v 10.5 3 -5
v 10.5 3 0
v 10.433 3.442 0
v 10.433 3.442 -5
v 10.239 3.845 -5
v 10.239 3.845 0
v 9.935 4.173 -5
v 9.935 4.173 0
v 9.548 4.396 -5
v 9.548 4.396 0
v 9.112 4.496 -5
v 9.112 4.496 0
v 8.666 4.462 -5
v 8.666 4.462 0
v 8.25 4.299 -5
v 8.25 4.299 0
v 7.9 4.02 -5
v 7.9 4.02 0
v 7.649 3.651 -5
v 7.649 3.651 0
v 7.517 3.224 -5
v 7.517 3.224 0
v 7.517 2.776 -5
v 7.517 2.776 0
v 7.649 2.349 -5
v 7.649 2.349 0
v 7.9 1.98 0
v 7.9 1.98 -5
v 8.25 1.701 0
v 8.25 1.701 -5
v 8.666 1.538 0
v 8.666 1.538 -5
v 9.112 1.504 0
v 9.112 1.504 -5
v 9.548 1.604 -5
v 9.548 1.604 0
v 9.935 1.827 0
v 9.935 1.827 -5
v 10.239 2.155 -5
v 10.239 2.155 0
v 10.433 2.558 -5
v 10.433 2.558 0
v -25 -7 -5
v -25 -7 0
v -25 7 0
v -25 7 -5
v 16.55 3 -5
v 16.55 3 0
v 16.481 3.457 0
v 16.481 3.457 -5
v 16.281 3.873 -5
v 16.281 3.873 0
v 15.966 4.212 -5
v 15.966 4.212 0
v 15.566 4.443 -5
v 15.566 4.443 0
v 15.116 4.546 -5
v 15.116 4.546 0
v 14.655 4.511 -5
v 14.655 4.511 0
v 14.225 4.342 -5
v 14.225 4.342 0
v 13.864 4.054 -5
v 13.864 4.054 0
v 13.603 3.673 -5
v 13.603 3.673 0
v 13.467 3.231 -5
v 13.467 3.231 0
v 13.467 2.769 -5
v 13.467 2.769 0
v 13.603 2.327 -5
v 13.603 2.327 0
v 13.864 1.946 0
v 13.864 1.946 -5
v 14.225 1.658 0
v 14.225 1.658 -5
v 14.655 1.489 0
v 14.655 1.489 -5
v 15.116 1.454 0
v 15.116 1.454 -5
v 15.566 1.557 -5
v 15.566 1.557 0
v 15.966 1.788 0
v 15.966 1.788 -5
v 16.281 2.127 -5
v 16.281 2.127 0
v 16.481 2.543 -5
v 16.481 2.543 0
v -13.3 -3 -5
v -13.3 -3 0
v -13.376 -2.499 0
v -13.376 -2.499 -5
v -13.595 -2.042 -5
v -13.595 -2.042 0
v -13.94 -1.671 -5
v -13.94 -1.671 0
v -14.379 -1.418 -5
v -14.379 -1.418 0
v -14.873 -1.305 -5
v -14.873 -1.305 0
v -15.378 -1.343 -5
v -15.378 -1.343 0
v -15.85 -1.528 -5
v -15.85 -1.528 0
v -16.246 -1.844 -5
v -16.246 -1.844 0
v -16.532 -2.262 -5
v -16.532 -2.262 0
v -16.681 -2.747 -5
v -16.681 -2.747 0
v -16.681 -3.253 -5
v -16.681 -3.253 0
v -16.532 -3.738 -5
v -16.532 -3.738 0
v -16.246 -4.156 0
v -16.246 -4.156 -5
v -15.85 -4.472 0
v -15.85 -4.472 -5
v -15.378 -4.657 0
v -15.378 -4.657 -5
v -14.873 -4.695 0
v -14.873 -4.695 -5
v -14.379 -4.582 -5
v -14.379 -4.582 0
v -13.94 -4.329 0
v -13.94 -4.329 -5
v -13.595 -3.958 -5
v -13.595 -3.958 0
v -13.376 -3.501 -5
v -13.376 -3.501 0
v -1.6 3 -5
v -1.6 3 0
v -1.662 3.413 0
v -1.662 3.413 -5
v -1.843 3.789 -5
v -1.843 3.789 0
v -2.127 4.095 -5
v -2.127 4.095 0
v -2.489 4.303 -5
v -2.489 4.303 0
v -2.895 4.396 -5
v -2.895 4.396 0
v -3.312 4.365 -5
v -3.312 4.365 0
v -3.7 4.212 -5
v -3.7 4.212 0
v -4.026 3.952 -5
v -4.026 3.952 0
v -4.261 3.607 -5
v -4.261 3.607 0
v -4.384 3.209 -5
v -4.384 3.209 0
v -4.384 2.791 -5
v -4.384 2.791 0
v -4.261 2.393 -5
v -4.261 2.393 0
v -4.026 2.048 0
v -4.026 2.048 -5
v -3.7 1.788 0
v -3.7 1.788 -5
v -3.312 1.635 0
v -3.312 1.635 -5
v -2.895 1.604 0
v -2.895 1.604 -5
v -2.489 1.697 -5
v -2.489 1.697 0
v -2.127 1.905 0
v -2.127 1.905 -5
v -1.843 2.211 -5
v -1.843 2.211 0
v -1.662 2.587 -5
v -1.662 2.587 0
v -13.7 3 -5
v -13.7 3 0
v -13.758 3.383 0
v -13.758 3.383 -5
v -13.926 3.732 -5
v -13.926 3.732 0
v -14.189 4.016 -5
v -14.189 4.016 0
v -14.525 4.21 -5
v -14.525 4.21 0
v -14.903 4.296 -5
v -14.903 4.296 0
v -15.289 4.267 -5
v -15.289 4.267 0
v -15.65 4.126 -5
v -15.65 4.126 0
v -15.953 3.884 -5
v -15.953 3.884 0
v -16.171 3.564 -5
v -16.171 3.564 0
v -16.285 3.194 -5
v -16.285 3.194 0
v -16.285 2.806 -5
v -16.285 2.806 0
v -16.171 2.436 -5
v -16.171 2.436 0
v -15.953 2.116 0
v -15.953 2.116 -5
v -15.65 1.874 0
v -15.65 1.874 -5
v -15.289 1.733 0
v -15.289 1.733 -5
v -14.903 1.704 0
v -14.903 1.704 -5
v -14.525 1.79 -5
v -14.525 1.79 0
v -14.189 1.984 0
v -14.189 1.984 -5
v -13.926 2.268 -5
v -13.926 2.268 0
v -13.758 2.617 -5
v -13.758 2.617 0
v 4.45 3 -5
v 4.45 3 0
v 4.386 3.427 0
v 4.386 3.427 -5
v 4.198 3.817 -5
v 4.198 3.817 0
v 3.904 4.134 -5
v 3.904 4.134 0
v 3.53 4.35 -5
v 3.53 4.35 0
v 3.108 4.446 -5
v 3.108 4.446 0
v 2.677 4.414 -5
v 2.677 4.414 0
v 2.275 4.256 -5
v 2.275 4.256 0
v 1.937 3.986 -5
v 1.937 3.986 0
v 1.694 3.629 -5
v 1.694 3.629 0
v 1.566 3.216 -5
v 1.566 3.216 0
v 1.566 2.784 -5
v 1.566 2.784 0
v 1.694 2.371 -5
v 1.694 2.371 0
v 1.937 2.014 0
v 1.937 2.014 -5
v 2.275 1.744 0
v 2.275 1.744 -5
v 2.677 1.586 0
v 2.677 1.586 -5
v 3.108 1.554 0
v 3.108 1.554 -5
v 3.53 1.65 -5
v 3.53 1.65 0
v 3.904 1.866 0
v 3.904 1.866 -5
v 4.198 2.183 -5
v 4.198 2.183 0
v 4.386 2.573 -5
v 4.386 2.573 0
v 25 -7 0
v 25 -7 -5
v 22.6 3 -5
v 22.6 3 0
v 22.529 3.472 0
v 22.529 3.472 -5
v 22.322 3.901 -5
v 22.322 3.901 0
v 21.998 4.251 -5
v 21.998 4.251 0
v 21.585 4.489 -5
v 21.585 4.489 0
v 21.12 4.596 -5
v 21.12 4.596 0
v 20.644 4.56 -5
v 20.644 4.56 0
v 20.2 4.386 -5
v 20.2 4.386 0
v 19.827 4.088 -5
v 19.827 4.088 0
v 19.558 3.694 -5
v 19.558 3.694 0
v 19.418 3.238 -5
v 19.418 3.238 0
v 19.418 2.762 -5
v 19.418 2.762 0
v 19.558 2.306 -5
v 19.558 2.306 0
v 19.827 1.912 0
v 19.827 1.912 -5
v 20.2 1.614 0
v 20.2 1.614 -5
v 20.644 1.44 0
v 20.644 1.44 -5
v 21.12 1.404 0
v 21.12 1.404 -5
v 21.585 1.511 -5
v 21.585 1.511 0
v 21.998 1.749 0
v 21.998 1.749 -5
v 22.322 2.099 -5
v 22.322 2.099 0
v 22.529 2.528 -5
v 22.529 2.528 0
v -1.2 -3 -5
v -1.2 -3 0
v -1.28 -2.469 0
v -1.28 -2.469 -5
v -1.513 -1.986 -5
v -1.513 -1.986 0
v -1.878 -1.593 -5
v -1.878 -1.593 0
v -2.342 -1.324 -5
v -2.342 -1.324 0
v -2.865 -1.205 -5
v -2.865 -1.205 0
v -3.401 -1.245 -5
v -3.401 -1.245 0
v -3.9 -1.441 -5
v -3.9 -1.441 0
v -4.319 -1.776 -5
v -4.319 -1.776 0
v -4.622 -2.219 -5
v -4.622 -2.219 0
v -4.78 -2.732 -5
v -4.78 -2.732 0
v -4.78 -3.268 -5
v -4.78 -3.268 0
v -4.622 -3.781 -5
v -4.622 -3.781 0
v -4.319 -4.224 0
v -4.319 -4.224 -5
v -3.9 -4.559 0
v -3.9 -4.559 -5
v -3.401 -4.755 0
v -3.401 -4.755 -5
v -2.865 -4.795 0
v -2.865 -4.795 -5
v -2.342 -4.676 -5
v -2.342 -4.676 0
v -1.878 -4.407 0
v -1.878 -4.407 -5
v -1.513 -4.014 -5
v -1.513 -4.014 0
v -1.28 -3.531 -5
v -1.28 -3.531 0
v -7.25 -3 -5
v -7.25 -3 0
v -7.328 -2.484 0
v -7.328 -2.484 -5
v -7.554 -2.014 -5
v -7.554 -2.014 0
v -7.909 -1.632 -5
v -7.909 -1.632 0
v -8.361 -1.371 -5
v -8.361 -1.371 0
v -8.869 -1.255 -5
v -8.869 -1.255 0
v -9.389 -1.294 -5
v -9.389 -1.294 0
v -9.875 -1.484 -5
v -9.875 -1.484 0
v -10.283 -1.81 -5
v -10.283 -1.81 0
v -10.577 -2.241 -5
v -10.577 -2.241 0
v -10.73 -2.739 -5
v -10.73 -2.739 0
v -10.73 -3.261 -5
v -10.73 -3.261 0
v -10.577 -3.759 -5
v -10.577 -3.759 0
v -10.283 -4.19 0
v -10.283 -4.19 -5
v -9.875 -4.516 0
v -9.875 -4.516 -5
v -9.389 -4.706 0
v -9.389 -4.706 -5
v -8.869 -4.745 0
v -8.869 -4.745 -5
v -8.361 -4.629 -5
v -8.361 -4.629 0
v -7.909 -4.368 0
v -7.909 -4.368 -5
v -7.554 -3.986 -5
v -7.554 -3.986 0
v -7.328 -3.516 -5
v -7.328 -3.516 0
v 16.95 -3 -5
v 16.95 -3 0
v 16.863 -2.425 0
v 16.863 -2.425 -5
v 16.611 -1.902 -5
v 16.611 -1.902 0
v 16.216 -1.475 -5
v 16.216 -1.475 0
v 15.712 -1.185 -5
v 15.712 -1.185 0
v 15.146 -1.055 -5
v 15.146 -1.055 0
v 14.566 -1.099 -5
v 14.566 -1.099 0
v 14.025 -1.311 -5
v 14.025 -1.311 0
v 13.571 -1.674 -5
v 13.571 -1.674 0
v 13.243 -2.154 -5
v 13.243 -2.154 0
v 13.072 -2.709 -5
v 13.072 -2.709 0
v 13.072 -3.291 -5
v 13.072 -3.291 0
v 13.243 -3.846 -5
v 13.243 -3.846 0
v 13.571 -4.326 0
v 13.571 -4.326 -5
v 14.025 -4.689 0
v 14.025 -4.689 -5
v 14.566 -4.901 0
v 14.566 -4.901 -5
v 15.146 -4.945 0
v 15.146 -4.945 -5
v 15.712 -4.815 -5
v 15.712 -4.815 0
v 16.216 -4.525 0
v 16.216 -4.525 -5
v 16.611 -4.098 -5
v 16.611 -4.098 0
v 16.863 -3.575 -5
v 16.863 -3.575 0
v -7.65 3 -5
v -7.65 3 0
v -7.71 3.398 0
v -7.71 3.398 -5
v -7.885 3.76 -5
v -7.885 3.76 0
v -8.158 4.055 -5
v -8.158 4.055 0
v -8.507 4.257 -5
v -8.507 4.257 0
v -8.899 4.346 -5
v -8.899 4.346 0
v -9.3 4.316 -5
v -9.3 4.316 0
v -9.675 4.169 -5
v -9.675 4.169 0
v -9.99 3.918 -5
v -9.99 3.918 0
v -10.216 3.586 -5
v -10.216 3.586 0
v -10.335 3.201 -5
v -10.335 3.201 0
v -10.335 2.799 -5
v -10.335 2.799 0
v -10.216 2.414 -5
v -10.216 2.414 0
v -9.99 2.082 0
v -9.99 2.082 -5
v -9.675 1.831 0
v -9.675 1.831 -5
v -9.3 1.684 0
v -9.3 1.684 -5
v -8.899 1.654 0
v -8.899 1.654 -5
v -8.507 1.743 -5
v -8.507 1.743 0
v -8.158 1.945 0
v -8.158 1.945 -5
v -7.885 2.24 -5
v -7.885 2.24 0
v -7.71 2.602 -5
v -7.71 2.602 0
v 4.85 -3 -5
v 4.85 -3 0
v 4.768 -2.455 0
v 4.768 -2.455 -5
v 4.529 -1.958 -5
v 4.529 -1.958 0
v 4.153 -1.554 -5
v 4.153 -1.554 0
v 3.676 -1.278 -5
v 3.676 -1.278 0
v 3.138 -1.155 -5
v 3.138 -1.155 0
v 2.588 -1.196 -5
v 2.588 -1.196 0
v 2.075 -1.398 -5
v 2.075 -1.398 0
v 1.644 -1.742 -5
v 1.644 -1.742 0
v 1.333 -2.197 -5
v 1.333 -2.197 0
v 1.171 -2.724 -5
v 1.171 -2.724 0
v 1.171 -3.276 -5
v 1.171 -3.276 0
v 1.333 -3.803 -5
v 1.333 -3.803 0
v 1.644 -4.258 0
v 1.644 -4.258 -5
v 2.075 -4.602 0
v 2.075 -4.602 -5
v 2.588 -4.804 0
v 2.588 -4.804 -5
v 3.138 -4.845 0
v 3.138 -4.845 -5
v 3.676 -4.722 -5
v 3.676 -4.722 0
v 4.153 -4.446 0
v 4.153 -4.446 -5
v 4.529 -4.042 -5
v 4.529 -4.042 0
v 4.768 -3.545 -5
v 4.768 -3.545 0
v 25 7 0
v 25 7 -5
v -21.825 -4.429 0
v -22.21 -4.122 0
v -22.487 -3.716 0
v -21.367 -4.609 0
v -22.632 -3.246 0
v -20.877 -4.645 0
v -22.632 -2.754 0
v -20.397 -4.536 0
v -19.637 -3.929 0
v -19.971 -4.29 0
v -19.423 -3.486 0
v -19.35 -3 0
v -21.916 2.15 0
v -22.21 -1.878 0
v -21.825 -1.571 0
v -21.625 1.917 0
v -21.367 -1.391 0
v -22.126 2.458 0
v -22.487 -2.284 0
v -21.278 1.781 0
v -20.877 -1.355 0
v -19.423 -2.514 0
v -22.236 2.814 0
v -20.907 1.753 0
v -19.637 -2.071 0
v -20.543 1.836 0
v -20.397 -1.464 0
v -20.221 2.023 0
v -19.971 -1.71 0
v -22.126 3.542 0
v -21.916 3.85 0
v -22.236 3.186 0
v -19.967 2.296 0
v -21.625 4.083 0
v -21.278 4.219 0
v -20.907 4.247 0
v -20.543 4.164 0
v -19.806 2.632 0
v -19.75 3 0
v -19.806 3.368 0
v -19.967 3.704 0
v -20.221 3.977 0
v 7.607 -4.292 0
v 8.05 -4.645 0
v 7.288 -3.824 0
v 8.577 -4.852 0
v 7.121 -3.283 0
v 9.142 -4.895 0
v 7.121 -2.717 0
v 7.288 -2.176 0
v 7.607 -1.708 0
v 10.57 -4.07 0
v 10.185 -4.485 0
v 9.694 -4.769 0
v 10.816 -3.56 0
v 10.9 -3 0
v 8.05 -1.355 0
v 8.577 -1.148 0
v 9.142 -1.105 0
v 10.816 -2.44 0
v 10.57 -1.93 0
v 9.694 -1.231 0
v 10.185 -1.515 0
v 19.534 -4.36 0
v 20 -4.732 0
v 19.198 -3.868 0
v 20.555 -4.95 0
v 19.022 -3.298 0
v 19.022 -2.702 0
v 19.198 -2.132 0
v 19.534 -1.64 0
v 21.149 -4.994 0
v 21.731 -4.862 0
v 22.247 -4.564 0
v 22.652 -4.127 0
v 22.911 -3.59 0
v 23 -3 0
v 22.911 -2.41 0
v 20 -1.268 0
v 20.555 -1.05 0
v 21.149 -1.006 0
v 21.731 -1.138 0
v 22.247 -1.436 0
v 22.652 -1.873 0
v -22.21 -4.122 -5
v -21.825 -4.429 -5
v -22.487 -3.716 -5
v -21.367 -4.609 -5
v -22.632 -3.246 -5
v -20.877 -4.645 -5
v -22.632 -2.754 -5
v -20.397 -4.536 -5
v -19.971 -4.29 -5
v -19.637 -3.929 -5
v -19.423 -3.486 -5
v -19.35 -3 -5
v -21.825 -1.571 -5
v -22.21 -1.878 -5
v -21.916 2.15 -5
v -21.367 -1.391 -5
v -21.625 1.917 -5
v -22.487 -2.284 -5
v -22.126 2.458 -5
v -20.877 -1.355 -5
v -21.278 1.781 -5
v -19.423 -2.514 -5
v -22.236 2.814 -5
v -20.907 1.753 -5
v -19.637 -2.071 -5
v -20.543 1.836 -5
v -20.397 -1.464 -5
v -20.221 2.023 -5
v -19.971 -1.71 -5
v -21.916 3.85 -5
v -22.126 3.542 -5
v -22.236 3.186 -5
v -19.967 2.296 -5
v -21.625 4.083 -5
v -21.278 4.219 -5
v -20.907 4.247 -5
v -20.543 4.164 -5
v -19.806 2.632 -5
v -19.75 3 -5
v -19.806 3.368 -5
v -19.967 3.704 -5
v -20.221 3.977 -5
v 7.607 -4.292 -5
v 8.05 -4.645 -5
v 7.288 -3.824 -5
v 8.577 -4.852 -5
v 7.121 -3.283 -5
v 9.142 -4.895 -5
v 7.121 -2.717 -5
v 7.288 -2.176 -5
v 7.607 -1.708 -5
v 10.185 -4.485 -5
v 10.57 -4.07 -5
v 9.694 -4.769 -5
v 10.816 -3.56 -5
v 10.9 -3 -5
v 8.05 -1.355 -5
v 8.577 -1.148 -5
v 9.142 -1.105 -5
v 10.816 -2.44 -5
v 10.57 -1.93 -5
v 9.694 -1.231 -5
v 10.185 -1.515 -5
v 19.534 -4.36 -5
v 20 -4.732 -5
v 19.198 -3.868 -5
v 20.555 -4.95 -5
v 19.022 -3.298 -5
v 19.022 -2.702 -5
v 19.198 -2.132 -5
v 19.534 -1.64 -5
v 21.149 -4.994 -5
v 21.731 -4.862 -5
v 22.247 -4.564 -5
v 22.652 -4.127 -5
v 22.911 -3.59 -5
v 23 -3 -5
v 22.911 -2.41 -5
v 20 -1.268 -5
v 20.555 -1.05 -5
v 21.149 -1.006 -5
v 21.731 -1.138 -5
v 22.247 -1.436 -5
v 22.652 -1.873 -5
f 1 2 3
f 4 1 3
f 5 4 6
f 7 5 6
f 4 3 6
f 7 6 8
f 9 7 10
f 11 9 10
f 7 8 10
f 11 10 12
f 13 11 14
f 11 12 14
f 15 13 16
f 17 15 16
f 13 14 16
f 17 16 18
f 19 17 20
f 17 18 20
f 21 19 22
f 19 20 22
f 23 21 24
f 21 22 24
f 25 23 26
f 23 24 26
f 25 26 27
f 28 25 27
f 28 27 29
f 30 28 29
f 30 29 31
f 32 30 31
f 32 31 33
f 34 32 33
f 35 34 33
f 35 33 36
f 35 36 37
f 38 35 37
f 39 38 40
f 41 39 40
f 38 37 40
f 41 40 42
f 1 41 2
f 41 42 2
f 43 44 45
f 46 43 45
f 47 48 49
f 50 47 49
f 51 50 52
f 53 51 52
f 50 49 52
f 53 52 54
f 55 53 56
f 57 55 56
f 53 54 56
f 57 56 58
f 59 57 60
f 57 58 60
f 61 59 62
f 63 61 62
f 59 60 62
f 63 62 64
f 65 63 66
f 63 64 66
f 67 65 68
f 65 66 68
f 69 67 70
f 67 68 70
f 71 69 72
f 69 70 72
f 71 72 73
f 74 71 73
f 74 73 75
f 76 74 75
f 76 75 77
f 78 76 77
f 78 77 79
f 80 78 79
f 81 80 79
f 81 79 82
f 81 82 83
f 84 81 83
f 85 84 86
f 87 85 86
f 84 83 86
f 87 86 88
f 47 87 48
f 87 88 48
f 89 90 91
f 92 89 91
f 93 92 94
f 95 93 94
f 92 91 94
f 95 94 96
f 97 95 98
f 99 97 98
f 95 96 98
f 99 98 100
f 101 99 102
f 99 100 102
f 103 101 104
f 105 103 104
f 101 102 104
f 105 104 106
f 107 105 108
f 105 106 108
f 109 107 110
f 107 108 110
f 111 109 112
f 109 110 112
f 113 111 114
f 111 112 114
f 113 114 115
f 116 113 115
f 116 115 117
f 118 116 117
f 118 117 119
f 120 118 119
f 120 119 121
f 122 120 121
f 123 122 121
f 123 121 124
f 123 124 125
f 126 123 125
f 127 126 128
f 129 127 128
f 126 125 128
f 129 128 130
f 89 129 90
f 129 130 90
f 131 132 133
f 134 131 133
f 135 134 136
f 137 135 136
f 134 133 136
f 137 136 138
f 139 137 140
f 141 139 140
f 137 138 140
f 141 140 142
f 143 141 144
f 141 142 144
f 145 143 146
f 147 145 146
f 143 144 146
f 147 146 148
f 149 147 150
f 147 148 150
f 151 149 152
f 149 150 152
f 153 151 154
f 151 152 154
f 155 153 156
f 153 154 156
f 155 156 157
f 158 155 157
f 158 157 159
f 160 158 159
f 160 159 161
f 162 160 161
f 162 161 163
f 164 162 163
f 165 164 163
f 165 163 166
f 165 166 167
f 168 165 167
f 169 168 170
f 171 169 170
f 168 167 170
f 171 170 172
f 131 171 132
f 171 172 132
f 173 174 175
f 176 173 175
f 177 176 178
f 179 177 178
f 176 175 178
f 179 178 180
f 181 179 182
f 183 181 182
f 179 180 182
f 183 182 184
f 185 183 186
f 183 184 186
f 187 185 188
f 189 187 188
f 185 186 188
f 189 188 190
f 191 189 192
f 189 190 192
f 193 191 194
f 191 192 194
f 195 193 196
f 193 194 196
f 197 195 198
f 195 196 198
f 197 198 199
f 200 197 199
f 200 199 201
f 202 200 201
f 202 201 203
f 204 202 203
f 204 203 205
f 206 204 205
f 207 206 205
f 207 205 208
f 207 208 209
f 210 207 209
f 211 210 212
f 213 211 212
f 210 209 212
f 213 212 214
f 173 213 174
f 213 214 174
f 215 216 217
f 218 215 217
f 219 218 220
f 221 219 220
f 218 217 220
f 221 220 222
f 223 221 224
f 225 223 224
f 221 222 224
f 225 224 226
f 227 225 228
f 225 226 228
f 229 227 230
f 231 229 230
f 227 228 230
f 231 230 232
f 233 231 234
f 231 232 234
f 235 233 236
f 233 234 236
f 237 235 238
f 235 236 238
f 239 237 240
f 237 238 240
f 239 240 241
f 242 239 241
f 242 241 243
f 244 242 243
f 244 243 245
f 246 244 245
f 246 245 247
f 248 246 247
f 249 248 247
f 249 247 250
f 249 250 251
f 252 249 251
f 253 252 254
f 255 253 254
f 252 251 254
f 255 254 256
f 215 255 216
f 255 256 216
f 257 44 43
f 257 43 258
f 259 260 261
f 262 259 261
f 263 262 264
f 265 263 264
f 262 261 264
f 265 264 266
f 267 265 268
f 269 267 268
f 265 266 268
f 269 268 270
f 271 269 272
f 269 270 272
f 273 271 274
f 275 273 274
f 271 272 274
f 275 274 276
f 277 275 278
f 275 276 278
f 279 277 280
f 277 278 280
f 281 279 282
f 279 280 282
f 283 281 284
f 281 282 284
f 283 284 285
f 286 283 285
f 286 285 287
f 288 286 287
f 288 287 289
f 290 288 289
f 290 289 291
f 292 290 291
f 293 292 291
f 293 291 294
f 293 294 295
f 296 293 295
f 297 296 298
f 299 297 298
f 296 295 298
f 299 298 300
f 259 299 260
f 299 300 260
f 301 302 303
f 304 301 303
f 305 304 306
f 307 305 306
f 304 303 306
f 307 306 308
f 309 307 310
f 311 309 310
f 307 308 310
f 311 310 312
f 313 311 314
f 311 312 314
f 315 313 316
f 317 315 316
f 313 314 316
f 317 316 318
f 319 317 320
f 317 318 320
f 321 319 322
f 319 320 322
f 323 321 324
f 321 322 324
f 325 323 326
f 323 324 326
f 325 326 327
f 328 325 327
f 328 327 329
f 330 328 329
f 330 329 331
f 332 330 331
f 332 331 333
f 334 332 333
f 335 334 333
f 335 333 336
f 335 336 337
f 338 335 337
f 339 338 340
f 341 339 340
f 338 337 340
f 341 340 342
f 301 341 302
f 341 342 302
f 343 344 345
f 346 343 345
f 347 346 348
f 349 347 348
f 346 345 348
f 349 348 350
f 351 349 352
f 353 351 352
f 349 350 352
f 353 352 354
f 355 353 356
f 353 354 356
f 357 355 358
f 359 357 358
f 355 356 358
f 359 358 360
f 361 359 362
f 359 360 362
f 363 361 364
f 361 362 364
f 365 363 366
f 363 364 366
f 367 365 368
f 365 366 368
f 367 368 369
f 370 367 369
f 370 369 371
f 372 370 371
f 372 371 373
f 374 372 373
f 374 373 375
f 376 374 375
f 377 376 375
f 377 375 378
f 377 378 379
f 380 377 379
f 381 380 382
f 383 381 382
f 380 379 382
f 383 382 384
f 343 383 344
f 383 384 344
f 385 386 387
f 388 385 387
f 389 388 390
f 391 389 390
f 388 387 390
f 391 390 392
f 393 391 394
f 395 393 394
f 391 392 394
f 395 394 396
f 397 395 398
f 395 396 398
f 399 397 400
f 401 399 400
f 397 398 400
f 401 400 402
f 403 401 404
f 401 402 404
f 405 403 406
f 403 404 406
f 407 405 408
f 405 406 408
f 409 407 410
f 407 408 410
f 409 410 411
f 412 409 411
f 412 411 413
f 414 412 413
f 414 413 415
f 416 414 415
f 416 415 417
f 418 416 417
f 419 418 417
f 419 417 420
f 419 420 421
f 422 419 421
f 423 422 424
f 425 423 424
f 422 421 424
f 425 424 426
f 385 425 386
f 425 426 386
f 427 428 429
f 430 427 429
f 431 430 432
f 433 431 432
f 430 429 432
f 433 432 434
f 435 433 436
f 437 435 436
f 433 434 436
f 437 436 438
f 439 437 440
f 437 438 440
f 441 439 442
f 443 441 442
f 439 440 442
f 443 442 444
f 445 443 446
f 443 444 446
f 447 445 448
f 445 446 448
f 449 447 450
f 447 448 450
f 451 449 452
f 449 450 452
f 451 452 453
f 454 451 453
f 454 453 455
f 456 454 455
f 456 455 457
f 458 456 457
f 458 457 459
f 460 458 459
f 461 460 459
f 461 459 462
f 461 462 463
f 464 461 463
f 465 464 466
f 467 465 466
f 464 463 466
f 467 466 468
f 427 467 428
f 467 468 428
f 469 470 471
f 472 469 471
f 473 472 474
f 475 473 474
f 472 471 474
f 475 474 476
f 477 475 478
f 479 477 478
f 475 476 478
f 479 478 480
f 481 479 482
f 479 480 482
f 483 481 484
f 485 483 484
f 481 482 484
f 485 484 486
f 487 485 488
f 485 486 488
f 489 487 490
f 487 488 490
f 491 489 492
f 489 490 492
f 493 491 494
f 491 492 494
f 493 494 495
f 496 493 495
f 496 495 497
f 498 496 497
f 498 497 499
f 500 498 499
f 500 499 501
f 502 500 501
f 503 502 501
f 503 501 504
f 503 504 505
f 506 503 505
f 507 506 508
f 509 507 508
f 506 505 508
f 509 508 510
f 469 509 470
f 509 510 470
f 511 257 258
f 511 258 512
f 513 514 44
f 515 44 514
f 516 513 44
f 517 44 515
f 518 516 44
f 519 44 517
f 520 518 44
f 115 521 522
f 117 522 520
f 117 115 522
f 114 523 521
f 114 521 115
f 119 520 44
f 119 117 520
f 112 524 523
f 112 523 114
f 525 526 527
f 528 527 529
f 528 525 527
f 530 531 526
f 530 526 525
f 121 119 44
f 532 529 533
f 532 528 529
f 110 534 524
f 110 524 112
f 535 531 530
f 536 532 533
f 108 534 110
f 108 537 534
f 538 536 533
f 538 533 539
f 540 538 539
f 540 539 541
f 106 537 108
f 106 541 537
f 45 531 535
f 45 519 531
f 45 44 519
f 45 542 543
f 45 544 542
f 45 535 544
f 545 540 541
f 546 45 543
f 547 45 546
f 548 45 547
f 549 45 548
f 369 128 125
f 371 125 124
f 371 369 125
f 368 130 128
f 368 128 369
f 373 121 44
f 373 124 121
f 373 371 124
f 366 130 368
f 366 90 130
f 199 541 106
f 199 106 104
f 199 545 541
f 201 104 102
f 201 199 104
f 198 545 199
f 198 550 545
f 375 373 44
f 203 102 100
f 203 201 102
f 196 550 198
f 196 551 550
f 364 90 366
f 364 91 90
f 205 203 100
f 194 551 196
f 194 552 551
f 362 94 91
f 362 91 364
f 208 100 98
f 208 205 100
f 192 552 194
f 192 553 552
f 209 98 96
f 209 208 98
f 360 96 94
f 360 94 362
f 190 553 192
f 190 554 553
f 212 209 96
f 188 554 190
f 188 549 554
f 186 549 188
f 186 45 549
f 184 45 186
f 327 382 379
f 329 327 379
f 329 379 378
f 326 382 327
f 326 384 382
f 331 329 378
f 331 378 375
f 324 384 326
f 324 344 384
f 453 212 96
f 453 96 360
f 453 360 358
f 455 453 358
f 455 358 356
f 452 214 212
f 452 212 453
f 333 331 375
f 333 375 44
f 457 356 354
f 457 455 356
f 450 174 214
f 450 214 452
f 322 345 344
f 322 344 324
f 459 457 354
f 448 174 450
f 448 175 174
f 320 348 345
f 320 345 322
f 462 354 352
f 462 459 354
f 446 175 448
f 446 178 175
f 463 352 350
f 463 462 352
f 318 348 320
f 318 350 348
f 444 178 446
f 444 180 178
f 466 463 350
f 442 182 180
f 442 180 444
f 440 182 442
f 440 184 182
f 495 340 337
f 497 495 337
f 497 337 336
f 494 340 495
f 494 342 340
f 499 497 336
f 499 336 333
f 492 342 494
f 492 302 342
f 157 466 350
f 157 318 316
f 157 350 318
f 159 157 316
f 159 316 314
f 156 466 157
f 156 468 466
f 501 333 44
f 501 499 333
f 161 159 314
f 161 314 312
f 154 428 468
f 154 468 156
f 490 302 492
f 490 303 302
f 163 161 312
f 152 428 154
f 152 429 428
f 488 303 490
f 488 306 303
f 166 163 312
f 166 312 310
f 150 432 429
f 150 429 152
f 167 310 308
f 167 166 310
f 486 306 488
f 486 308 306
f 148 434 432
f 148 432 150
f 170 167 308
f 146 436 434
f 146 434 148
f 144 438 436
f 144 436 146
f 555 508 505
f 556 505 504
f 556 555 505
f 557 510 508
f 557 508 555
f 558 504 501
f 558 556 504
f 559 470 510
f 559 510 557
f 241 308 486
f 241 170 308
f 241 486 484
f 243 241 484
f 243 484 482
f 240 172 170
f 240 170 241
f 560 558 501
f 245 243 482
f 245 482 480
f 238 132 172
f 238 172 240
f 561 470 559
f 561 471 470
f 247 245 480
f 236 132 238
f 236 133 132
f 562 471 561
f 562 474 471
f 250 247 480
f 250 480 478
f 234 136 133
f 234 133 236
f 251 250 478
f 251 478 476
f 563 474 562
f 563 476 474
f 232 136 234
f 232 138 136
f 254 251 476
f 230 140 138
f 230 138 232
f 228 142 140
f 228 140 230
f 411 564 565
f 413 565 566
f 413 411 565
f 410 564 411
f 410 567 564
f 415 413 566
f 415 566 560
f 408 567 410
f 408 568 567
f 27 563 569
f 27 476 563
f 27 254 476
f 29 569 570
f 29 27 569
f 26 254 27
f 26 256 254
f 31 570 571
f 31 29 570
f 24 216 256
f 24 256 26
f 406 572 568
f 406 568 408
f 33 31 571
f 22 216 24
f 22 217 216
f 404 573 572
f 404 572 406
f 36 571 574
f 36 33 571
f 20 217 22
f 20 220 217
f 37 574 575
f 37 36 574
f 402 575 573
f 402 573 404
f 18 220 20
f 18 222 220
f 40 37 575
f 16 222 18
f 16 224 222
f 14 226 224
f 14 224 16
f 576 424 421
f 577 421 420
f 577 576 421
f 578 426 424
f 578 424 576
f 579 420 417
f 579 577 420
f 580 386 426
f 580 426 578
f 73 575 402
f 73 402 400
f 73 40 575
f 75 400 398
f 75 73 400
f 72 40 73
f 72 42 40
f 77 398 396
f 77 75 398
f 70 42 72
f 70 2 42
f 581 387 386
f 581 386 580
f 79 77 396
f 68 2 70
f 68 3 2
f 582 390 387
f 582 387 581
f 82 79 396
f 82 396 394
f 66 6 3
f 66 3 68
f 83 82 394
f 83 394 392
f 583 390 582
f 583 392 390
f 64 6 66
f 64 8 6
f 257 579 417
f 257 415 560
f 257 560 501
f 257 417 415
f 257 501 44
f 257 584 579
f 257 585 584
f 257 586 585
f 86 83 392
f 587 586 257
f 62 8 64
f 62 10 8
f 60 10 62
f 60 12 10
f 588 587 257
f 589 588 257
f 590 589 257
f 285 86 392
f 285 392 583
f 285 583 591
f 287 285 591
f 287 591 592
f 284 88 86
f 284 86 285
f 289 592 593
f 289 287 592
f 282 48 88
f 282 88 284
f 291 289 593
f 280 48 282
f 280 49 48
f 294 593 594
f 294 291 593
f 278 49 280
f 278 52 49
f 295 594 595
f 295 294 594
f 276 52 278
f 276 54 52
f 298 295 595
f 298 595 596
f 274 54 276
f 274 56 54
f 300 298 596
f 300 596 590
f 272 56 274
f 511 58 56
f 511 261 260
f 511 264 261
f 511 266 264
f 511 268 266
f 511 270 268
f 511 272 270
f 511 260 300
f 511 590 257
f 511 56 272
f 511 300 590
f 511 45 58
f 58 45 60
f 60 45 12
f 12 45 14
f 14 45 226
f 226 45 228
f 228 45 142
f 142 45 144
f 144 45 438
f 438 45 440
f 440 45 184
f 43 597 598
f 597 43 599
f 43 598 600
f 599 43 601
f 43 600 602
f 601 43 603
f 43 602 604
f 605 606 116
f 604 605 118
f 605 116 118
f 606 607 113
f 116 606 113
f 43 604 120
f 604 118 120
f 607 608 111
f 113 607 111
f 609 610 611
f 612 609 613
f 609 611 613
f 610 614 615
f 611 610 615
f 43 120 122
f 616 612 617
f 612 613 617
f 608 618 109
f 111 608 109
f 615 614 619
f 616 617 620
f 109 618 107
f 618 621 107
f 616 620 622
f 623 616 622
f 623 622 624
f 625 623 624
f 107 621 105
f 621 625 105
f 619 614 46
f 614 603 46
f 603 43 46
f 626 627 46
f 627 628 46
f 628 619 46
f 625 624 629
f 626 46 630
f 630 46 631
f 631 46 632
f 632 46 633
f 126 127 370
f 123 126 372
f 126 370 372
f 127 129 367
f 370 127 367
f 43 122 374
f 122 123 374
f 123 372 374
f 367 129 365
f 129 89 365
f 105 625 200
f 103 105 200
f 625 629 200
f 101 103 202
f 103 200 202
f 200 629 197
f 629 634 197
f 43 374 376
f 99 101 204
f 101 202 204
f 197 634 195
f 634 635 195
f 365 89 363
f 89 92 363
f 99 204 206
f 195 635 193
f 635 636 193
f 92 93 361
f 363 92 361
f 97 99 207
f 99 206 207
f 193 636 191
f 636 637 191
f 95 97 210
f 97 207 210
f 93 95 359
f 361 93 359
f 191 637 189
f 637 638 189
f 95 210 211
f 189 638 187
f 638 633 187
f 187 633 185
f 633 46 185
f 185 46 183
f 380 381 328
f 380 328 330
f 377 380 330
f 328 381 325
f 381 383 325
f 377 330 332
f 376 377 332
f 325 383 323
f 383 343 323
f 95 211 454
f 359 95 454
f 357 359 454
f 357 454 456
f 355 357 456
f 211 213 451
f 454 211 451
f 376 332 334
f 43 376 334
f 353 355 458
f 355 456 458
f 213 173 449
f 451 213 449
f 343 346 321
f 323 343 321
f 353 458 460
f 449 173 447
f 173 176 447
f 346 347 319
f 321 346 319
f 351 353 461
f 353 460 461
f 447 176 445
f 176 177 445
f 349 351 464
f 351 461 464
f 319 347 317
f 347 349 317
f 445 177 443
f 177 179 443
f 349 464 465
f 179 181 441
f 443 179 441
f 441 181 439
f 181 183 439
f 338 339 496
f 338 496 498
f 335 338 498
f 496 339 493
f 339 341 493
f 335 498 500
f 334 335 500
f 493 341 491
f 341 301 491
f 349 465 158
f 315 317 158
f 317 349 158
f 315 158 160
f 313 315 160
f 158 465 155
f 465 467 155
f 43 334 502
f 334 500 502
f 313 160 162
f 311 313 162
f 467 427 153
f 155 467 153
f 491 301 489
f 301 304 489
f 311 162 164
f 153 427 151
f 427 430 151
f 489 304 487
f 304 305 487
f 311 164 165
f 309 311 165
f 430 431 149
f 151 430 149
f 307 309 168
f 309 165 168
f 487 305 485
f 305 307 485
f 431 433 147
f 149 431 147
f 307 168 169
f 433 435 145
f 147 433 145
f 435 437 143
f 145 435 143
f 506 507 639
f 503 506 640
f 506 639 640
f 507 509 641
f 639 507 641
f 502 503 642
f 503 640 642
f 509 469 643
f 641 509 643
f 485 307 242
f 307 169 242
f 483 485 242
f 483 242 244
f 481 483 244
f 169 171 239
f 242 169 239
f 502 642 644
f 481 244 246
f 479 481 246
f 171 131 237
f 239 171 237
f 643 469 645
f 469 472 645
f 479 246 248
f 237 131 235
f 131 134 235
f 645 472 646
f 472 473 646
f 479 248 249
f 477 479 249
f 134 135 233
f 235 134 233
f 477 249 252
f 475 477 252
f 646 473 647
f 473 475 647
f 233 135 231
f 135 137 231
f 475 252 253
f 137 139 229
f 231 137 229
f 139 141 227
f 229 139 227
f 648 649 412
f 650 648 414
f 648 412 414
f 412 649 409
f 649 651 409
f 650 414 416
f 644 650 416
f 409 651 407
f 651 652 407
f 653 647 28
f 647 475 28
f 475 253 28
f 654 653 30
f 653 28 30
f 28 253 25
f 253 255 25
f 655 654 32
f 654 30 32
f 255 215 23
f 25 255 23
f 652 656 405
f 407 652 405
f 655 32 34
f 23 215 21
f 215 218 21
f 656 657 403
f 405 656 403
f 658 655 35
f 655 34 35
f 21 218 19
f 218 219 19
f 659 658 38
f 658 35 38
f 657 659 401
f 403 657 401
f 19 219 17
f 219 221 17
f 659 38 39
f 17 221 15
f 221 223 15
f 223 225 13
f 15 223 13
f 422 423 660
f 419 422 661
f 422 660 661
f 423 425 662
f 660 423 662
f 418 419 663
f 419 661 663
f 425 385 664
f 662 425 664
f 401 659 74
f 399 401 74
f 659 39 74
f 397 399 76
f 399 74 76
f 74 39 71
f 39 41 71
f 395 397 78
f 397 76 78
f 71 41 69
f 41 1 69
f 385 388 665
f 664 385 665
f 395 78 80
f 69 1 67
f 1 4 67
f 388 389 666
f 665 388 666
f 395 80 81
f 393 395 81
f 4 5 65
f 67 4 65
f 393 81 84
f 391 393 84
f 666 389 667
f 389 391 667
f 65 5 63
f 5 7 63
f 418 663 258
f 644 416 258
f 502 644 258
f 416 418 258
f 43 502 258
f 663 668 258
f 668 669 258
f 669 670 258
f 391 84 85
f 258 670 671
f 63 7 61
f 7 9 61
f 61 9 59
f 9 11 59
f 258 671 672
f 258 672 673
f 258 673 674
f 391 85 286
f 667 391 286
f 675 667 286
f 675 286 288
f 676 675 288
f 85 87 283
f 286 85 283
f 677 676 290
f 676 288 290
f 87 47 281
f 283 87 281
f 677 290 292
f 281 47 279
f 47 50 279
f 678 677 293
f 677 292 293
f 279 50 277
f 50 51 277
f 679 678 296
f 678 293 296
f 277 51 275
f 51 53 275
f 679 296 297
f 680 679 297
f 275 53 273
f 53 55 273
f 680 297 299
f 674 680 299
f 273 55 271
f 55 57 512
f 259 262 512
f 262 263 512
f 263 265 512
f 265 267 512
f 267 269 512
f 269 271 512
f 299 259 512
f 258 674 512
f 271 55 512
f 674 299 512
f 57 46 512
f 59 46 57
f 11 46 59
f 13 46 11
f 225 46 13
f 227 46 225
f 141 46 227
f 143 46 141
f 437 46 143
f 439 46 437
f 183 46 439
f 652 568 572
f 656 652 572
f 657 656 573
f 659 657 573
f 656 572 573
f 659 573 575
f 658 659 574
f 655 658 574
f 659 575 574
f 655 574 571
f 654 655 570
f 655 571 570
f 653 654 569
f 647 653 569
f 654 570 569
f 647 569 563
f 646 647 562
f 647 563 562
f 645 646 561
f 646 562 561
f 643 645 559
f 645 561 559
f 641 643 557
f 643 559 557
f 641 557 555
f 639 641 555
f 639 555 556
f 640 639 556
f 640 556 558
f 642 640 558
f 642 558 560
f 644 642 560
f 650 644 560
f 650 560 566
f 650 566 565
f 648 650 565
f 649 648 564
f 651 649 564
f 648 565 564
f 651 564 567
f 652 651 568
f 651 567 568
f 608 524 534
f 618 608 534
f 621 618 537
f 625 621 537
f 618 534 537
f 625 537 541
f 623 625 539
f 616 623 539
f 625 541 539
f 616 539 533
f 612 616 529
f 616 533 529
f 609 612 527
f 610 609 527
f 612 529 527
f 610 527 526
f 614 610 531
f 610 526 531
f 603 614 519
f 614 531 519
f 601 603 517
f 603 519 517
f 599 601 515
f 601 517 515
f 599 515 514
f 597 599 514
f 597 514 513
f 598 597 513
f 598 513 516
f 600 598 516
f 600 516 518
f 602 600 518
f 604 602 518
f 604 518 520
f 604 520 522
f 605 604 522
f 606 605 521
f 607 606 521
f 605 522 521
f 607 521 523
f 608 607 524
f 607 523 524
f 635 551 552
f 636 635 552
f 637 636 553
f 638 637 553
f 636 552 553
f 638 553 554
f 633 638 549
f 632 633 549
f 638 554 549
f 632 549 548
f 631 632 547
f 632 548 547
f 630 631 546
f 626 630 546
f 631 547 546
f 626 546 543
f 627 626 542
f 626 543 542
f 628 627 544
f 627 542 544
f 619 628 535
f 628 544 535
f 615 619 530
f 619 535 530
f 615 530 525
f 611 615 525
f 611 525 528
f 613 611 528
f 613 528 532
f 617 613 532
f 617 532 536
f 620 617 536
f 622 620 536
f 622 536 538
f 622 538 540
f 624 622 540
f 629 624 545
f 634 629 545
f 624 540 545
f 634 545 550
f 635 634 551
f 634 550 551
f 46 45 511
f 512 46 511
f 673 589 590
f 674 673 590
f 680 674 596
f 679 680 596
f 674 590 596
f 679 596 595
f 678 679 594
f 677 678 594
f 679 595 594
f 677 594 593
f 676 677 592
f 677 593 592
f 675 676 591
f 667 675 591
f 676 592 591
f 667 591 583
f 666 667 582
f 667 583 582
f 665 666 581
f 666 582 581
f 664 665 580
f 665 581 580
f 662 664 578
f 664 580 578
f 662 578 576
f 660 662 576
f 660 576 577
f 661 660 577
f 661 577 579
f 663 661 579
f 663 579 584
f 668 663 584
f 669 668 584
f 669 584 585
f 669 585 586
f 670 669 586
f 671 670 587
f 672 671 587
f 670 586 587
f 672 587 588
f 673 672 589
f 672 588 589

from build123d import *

# Parameters (mm, degrees)
F0_W     = 50
F0_H     = 14
F0_R     = 1.65
F0_R_2   = 1.7
F0_R_3   = 1.75
F0_R_4   = 1.8
F0_R_5   = 1.85
F0_R_6   = 1.9
F0_R_7   = 1.95
F0_R_8   = 2
F0_R_9   = 1.25
F0_R_10  = 1.3
F0_R_11  = 1.35
F0_R_12  = 1.4
F0_R_13  = 1.45
F0_R_14  = 1.5
F0_R_15  = 1.55
F0_R_16  = 1.6
F1_DEPTH = 5


with BuildPart() as f1:
    # F0 (on Top) → F1 (new body)
    with BuildSketch(Plane.XY):
        Rectangle(F0_W, F0_H)
        with Locations((-21, -3)):
            Circle(F0_R, mode=Mode.SUBTRACT)
        with Locations((-15, -3)):
            Circle(F0_R_2, mode=Mode.SUBTRACT)
        with Locations((-9, -3)):
            Circle(F0_R_3, mode=Mode.SUBTRACT)
        with Locations((-3, -3)):
            Circle(F0_R_4, mode=Mode.SUBTRACT)
        with Locations((3, -3)):
            Circle(F0_R_5, mode=Mode.SUBTRACT)
        with Locations((9, -3)):
            Circle(F0_R_6, mode=Mode.SUBTRACT)
        with Locations((15, -3)):
            Circle(F0_R_7, mode=Mode.SUBTRACT)
        with Locations((21, -3)):
            Circle(F0_R_8, mode=Mode.SUBTRACT)
        with Locations((-21, 3)):
            Circle(F0_R_9, mode=Mode.SUBTRACT)
        with Locations((-15, 3)):
            Circle(F0_R_10, mode=Mode.SUBTRACT)
        with Locations((-9, 3)):
            Circle(F0_R_11, mode=Mode.SUBTRACT)
        with Locations((-3, 3)):
            Circle(F0_R_12, mode=Mode.SUBTRACT)
        with Locations((3, 3)):
            Circle(F0_R_13, mode=Mode.SUBTRACT)
        with Locations((9, 3)):
            Circle(F0_R_14, mode=Mode.SUBTRACT)
        with Locations((15, 3)):
            Circle(F0_R_15, mode=Mode.SUBTRACT)
        with Locations((21, 3)):
            Circle(F0_R_16, mode=Mode.SUBTRACT)
    extrude(amount=-F1_DEPTH)


solid = f1.part
